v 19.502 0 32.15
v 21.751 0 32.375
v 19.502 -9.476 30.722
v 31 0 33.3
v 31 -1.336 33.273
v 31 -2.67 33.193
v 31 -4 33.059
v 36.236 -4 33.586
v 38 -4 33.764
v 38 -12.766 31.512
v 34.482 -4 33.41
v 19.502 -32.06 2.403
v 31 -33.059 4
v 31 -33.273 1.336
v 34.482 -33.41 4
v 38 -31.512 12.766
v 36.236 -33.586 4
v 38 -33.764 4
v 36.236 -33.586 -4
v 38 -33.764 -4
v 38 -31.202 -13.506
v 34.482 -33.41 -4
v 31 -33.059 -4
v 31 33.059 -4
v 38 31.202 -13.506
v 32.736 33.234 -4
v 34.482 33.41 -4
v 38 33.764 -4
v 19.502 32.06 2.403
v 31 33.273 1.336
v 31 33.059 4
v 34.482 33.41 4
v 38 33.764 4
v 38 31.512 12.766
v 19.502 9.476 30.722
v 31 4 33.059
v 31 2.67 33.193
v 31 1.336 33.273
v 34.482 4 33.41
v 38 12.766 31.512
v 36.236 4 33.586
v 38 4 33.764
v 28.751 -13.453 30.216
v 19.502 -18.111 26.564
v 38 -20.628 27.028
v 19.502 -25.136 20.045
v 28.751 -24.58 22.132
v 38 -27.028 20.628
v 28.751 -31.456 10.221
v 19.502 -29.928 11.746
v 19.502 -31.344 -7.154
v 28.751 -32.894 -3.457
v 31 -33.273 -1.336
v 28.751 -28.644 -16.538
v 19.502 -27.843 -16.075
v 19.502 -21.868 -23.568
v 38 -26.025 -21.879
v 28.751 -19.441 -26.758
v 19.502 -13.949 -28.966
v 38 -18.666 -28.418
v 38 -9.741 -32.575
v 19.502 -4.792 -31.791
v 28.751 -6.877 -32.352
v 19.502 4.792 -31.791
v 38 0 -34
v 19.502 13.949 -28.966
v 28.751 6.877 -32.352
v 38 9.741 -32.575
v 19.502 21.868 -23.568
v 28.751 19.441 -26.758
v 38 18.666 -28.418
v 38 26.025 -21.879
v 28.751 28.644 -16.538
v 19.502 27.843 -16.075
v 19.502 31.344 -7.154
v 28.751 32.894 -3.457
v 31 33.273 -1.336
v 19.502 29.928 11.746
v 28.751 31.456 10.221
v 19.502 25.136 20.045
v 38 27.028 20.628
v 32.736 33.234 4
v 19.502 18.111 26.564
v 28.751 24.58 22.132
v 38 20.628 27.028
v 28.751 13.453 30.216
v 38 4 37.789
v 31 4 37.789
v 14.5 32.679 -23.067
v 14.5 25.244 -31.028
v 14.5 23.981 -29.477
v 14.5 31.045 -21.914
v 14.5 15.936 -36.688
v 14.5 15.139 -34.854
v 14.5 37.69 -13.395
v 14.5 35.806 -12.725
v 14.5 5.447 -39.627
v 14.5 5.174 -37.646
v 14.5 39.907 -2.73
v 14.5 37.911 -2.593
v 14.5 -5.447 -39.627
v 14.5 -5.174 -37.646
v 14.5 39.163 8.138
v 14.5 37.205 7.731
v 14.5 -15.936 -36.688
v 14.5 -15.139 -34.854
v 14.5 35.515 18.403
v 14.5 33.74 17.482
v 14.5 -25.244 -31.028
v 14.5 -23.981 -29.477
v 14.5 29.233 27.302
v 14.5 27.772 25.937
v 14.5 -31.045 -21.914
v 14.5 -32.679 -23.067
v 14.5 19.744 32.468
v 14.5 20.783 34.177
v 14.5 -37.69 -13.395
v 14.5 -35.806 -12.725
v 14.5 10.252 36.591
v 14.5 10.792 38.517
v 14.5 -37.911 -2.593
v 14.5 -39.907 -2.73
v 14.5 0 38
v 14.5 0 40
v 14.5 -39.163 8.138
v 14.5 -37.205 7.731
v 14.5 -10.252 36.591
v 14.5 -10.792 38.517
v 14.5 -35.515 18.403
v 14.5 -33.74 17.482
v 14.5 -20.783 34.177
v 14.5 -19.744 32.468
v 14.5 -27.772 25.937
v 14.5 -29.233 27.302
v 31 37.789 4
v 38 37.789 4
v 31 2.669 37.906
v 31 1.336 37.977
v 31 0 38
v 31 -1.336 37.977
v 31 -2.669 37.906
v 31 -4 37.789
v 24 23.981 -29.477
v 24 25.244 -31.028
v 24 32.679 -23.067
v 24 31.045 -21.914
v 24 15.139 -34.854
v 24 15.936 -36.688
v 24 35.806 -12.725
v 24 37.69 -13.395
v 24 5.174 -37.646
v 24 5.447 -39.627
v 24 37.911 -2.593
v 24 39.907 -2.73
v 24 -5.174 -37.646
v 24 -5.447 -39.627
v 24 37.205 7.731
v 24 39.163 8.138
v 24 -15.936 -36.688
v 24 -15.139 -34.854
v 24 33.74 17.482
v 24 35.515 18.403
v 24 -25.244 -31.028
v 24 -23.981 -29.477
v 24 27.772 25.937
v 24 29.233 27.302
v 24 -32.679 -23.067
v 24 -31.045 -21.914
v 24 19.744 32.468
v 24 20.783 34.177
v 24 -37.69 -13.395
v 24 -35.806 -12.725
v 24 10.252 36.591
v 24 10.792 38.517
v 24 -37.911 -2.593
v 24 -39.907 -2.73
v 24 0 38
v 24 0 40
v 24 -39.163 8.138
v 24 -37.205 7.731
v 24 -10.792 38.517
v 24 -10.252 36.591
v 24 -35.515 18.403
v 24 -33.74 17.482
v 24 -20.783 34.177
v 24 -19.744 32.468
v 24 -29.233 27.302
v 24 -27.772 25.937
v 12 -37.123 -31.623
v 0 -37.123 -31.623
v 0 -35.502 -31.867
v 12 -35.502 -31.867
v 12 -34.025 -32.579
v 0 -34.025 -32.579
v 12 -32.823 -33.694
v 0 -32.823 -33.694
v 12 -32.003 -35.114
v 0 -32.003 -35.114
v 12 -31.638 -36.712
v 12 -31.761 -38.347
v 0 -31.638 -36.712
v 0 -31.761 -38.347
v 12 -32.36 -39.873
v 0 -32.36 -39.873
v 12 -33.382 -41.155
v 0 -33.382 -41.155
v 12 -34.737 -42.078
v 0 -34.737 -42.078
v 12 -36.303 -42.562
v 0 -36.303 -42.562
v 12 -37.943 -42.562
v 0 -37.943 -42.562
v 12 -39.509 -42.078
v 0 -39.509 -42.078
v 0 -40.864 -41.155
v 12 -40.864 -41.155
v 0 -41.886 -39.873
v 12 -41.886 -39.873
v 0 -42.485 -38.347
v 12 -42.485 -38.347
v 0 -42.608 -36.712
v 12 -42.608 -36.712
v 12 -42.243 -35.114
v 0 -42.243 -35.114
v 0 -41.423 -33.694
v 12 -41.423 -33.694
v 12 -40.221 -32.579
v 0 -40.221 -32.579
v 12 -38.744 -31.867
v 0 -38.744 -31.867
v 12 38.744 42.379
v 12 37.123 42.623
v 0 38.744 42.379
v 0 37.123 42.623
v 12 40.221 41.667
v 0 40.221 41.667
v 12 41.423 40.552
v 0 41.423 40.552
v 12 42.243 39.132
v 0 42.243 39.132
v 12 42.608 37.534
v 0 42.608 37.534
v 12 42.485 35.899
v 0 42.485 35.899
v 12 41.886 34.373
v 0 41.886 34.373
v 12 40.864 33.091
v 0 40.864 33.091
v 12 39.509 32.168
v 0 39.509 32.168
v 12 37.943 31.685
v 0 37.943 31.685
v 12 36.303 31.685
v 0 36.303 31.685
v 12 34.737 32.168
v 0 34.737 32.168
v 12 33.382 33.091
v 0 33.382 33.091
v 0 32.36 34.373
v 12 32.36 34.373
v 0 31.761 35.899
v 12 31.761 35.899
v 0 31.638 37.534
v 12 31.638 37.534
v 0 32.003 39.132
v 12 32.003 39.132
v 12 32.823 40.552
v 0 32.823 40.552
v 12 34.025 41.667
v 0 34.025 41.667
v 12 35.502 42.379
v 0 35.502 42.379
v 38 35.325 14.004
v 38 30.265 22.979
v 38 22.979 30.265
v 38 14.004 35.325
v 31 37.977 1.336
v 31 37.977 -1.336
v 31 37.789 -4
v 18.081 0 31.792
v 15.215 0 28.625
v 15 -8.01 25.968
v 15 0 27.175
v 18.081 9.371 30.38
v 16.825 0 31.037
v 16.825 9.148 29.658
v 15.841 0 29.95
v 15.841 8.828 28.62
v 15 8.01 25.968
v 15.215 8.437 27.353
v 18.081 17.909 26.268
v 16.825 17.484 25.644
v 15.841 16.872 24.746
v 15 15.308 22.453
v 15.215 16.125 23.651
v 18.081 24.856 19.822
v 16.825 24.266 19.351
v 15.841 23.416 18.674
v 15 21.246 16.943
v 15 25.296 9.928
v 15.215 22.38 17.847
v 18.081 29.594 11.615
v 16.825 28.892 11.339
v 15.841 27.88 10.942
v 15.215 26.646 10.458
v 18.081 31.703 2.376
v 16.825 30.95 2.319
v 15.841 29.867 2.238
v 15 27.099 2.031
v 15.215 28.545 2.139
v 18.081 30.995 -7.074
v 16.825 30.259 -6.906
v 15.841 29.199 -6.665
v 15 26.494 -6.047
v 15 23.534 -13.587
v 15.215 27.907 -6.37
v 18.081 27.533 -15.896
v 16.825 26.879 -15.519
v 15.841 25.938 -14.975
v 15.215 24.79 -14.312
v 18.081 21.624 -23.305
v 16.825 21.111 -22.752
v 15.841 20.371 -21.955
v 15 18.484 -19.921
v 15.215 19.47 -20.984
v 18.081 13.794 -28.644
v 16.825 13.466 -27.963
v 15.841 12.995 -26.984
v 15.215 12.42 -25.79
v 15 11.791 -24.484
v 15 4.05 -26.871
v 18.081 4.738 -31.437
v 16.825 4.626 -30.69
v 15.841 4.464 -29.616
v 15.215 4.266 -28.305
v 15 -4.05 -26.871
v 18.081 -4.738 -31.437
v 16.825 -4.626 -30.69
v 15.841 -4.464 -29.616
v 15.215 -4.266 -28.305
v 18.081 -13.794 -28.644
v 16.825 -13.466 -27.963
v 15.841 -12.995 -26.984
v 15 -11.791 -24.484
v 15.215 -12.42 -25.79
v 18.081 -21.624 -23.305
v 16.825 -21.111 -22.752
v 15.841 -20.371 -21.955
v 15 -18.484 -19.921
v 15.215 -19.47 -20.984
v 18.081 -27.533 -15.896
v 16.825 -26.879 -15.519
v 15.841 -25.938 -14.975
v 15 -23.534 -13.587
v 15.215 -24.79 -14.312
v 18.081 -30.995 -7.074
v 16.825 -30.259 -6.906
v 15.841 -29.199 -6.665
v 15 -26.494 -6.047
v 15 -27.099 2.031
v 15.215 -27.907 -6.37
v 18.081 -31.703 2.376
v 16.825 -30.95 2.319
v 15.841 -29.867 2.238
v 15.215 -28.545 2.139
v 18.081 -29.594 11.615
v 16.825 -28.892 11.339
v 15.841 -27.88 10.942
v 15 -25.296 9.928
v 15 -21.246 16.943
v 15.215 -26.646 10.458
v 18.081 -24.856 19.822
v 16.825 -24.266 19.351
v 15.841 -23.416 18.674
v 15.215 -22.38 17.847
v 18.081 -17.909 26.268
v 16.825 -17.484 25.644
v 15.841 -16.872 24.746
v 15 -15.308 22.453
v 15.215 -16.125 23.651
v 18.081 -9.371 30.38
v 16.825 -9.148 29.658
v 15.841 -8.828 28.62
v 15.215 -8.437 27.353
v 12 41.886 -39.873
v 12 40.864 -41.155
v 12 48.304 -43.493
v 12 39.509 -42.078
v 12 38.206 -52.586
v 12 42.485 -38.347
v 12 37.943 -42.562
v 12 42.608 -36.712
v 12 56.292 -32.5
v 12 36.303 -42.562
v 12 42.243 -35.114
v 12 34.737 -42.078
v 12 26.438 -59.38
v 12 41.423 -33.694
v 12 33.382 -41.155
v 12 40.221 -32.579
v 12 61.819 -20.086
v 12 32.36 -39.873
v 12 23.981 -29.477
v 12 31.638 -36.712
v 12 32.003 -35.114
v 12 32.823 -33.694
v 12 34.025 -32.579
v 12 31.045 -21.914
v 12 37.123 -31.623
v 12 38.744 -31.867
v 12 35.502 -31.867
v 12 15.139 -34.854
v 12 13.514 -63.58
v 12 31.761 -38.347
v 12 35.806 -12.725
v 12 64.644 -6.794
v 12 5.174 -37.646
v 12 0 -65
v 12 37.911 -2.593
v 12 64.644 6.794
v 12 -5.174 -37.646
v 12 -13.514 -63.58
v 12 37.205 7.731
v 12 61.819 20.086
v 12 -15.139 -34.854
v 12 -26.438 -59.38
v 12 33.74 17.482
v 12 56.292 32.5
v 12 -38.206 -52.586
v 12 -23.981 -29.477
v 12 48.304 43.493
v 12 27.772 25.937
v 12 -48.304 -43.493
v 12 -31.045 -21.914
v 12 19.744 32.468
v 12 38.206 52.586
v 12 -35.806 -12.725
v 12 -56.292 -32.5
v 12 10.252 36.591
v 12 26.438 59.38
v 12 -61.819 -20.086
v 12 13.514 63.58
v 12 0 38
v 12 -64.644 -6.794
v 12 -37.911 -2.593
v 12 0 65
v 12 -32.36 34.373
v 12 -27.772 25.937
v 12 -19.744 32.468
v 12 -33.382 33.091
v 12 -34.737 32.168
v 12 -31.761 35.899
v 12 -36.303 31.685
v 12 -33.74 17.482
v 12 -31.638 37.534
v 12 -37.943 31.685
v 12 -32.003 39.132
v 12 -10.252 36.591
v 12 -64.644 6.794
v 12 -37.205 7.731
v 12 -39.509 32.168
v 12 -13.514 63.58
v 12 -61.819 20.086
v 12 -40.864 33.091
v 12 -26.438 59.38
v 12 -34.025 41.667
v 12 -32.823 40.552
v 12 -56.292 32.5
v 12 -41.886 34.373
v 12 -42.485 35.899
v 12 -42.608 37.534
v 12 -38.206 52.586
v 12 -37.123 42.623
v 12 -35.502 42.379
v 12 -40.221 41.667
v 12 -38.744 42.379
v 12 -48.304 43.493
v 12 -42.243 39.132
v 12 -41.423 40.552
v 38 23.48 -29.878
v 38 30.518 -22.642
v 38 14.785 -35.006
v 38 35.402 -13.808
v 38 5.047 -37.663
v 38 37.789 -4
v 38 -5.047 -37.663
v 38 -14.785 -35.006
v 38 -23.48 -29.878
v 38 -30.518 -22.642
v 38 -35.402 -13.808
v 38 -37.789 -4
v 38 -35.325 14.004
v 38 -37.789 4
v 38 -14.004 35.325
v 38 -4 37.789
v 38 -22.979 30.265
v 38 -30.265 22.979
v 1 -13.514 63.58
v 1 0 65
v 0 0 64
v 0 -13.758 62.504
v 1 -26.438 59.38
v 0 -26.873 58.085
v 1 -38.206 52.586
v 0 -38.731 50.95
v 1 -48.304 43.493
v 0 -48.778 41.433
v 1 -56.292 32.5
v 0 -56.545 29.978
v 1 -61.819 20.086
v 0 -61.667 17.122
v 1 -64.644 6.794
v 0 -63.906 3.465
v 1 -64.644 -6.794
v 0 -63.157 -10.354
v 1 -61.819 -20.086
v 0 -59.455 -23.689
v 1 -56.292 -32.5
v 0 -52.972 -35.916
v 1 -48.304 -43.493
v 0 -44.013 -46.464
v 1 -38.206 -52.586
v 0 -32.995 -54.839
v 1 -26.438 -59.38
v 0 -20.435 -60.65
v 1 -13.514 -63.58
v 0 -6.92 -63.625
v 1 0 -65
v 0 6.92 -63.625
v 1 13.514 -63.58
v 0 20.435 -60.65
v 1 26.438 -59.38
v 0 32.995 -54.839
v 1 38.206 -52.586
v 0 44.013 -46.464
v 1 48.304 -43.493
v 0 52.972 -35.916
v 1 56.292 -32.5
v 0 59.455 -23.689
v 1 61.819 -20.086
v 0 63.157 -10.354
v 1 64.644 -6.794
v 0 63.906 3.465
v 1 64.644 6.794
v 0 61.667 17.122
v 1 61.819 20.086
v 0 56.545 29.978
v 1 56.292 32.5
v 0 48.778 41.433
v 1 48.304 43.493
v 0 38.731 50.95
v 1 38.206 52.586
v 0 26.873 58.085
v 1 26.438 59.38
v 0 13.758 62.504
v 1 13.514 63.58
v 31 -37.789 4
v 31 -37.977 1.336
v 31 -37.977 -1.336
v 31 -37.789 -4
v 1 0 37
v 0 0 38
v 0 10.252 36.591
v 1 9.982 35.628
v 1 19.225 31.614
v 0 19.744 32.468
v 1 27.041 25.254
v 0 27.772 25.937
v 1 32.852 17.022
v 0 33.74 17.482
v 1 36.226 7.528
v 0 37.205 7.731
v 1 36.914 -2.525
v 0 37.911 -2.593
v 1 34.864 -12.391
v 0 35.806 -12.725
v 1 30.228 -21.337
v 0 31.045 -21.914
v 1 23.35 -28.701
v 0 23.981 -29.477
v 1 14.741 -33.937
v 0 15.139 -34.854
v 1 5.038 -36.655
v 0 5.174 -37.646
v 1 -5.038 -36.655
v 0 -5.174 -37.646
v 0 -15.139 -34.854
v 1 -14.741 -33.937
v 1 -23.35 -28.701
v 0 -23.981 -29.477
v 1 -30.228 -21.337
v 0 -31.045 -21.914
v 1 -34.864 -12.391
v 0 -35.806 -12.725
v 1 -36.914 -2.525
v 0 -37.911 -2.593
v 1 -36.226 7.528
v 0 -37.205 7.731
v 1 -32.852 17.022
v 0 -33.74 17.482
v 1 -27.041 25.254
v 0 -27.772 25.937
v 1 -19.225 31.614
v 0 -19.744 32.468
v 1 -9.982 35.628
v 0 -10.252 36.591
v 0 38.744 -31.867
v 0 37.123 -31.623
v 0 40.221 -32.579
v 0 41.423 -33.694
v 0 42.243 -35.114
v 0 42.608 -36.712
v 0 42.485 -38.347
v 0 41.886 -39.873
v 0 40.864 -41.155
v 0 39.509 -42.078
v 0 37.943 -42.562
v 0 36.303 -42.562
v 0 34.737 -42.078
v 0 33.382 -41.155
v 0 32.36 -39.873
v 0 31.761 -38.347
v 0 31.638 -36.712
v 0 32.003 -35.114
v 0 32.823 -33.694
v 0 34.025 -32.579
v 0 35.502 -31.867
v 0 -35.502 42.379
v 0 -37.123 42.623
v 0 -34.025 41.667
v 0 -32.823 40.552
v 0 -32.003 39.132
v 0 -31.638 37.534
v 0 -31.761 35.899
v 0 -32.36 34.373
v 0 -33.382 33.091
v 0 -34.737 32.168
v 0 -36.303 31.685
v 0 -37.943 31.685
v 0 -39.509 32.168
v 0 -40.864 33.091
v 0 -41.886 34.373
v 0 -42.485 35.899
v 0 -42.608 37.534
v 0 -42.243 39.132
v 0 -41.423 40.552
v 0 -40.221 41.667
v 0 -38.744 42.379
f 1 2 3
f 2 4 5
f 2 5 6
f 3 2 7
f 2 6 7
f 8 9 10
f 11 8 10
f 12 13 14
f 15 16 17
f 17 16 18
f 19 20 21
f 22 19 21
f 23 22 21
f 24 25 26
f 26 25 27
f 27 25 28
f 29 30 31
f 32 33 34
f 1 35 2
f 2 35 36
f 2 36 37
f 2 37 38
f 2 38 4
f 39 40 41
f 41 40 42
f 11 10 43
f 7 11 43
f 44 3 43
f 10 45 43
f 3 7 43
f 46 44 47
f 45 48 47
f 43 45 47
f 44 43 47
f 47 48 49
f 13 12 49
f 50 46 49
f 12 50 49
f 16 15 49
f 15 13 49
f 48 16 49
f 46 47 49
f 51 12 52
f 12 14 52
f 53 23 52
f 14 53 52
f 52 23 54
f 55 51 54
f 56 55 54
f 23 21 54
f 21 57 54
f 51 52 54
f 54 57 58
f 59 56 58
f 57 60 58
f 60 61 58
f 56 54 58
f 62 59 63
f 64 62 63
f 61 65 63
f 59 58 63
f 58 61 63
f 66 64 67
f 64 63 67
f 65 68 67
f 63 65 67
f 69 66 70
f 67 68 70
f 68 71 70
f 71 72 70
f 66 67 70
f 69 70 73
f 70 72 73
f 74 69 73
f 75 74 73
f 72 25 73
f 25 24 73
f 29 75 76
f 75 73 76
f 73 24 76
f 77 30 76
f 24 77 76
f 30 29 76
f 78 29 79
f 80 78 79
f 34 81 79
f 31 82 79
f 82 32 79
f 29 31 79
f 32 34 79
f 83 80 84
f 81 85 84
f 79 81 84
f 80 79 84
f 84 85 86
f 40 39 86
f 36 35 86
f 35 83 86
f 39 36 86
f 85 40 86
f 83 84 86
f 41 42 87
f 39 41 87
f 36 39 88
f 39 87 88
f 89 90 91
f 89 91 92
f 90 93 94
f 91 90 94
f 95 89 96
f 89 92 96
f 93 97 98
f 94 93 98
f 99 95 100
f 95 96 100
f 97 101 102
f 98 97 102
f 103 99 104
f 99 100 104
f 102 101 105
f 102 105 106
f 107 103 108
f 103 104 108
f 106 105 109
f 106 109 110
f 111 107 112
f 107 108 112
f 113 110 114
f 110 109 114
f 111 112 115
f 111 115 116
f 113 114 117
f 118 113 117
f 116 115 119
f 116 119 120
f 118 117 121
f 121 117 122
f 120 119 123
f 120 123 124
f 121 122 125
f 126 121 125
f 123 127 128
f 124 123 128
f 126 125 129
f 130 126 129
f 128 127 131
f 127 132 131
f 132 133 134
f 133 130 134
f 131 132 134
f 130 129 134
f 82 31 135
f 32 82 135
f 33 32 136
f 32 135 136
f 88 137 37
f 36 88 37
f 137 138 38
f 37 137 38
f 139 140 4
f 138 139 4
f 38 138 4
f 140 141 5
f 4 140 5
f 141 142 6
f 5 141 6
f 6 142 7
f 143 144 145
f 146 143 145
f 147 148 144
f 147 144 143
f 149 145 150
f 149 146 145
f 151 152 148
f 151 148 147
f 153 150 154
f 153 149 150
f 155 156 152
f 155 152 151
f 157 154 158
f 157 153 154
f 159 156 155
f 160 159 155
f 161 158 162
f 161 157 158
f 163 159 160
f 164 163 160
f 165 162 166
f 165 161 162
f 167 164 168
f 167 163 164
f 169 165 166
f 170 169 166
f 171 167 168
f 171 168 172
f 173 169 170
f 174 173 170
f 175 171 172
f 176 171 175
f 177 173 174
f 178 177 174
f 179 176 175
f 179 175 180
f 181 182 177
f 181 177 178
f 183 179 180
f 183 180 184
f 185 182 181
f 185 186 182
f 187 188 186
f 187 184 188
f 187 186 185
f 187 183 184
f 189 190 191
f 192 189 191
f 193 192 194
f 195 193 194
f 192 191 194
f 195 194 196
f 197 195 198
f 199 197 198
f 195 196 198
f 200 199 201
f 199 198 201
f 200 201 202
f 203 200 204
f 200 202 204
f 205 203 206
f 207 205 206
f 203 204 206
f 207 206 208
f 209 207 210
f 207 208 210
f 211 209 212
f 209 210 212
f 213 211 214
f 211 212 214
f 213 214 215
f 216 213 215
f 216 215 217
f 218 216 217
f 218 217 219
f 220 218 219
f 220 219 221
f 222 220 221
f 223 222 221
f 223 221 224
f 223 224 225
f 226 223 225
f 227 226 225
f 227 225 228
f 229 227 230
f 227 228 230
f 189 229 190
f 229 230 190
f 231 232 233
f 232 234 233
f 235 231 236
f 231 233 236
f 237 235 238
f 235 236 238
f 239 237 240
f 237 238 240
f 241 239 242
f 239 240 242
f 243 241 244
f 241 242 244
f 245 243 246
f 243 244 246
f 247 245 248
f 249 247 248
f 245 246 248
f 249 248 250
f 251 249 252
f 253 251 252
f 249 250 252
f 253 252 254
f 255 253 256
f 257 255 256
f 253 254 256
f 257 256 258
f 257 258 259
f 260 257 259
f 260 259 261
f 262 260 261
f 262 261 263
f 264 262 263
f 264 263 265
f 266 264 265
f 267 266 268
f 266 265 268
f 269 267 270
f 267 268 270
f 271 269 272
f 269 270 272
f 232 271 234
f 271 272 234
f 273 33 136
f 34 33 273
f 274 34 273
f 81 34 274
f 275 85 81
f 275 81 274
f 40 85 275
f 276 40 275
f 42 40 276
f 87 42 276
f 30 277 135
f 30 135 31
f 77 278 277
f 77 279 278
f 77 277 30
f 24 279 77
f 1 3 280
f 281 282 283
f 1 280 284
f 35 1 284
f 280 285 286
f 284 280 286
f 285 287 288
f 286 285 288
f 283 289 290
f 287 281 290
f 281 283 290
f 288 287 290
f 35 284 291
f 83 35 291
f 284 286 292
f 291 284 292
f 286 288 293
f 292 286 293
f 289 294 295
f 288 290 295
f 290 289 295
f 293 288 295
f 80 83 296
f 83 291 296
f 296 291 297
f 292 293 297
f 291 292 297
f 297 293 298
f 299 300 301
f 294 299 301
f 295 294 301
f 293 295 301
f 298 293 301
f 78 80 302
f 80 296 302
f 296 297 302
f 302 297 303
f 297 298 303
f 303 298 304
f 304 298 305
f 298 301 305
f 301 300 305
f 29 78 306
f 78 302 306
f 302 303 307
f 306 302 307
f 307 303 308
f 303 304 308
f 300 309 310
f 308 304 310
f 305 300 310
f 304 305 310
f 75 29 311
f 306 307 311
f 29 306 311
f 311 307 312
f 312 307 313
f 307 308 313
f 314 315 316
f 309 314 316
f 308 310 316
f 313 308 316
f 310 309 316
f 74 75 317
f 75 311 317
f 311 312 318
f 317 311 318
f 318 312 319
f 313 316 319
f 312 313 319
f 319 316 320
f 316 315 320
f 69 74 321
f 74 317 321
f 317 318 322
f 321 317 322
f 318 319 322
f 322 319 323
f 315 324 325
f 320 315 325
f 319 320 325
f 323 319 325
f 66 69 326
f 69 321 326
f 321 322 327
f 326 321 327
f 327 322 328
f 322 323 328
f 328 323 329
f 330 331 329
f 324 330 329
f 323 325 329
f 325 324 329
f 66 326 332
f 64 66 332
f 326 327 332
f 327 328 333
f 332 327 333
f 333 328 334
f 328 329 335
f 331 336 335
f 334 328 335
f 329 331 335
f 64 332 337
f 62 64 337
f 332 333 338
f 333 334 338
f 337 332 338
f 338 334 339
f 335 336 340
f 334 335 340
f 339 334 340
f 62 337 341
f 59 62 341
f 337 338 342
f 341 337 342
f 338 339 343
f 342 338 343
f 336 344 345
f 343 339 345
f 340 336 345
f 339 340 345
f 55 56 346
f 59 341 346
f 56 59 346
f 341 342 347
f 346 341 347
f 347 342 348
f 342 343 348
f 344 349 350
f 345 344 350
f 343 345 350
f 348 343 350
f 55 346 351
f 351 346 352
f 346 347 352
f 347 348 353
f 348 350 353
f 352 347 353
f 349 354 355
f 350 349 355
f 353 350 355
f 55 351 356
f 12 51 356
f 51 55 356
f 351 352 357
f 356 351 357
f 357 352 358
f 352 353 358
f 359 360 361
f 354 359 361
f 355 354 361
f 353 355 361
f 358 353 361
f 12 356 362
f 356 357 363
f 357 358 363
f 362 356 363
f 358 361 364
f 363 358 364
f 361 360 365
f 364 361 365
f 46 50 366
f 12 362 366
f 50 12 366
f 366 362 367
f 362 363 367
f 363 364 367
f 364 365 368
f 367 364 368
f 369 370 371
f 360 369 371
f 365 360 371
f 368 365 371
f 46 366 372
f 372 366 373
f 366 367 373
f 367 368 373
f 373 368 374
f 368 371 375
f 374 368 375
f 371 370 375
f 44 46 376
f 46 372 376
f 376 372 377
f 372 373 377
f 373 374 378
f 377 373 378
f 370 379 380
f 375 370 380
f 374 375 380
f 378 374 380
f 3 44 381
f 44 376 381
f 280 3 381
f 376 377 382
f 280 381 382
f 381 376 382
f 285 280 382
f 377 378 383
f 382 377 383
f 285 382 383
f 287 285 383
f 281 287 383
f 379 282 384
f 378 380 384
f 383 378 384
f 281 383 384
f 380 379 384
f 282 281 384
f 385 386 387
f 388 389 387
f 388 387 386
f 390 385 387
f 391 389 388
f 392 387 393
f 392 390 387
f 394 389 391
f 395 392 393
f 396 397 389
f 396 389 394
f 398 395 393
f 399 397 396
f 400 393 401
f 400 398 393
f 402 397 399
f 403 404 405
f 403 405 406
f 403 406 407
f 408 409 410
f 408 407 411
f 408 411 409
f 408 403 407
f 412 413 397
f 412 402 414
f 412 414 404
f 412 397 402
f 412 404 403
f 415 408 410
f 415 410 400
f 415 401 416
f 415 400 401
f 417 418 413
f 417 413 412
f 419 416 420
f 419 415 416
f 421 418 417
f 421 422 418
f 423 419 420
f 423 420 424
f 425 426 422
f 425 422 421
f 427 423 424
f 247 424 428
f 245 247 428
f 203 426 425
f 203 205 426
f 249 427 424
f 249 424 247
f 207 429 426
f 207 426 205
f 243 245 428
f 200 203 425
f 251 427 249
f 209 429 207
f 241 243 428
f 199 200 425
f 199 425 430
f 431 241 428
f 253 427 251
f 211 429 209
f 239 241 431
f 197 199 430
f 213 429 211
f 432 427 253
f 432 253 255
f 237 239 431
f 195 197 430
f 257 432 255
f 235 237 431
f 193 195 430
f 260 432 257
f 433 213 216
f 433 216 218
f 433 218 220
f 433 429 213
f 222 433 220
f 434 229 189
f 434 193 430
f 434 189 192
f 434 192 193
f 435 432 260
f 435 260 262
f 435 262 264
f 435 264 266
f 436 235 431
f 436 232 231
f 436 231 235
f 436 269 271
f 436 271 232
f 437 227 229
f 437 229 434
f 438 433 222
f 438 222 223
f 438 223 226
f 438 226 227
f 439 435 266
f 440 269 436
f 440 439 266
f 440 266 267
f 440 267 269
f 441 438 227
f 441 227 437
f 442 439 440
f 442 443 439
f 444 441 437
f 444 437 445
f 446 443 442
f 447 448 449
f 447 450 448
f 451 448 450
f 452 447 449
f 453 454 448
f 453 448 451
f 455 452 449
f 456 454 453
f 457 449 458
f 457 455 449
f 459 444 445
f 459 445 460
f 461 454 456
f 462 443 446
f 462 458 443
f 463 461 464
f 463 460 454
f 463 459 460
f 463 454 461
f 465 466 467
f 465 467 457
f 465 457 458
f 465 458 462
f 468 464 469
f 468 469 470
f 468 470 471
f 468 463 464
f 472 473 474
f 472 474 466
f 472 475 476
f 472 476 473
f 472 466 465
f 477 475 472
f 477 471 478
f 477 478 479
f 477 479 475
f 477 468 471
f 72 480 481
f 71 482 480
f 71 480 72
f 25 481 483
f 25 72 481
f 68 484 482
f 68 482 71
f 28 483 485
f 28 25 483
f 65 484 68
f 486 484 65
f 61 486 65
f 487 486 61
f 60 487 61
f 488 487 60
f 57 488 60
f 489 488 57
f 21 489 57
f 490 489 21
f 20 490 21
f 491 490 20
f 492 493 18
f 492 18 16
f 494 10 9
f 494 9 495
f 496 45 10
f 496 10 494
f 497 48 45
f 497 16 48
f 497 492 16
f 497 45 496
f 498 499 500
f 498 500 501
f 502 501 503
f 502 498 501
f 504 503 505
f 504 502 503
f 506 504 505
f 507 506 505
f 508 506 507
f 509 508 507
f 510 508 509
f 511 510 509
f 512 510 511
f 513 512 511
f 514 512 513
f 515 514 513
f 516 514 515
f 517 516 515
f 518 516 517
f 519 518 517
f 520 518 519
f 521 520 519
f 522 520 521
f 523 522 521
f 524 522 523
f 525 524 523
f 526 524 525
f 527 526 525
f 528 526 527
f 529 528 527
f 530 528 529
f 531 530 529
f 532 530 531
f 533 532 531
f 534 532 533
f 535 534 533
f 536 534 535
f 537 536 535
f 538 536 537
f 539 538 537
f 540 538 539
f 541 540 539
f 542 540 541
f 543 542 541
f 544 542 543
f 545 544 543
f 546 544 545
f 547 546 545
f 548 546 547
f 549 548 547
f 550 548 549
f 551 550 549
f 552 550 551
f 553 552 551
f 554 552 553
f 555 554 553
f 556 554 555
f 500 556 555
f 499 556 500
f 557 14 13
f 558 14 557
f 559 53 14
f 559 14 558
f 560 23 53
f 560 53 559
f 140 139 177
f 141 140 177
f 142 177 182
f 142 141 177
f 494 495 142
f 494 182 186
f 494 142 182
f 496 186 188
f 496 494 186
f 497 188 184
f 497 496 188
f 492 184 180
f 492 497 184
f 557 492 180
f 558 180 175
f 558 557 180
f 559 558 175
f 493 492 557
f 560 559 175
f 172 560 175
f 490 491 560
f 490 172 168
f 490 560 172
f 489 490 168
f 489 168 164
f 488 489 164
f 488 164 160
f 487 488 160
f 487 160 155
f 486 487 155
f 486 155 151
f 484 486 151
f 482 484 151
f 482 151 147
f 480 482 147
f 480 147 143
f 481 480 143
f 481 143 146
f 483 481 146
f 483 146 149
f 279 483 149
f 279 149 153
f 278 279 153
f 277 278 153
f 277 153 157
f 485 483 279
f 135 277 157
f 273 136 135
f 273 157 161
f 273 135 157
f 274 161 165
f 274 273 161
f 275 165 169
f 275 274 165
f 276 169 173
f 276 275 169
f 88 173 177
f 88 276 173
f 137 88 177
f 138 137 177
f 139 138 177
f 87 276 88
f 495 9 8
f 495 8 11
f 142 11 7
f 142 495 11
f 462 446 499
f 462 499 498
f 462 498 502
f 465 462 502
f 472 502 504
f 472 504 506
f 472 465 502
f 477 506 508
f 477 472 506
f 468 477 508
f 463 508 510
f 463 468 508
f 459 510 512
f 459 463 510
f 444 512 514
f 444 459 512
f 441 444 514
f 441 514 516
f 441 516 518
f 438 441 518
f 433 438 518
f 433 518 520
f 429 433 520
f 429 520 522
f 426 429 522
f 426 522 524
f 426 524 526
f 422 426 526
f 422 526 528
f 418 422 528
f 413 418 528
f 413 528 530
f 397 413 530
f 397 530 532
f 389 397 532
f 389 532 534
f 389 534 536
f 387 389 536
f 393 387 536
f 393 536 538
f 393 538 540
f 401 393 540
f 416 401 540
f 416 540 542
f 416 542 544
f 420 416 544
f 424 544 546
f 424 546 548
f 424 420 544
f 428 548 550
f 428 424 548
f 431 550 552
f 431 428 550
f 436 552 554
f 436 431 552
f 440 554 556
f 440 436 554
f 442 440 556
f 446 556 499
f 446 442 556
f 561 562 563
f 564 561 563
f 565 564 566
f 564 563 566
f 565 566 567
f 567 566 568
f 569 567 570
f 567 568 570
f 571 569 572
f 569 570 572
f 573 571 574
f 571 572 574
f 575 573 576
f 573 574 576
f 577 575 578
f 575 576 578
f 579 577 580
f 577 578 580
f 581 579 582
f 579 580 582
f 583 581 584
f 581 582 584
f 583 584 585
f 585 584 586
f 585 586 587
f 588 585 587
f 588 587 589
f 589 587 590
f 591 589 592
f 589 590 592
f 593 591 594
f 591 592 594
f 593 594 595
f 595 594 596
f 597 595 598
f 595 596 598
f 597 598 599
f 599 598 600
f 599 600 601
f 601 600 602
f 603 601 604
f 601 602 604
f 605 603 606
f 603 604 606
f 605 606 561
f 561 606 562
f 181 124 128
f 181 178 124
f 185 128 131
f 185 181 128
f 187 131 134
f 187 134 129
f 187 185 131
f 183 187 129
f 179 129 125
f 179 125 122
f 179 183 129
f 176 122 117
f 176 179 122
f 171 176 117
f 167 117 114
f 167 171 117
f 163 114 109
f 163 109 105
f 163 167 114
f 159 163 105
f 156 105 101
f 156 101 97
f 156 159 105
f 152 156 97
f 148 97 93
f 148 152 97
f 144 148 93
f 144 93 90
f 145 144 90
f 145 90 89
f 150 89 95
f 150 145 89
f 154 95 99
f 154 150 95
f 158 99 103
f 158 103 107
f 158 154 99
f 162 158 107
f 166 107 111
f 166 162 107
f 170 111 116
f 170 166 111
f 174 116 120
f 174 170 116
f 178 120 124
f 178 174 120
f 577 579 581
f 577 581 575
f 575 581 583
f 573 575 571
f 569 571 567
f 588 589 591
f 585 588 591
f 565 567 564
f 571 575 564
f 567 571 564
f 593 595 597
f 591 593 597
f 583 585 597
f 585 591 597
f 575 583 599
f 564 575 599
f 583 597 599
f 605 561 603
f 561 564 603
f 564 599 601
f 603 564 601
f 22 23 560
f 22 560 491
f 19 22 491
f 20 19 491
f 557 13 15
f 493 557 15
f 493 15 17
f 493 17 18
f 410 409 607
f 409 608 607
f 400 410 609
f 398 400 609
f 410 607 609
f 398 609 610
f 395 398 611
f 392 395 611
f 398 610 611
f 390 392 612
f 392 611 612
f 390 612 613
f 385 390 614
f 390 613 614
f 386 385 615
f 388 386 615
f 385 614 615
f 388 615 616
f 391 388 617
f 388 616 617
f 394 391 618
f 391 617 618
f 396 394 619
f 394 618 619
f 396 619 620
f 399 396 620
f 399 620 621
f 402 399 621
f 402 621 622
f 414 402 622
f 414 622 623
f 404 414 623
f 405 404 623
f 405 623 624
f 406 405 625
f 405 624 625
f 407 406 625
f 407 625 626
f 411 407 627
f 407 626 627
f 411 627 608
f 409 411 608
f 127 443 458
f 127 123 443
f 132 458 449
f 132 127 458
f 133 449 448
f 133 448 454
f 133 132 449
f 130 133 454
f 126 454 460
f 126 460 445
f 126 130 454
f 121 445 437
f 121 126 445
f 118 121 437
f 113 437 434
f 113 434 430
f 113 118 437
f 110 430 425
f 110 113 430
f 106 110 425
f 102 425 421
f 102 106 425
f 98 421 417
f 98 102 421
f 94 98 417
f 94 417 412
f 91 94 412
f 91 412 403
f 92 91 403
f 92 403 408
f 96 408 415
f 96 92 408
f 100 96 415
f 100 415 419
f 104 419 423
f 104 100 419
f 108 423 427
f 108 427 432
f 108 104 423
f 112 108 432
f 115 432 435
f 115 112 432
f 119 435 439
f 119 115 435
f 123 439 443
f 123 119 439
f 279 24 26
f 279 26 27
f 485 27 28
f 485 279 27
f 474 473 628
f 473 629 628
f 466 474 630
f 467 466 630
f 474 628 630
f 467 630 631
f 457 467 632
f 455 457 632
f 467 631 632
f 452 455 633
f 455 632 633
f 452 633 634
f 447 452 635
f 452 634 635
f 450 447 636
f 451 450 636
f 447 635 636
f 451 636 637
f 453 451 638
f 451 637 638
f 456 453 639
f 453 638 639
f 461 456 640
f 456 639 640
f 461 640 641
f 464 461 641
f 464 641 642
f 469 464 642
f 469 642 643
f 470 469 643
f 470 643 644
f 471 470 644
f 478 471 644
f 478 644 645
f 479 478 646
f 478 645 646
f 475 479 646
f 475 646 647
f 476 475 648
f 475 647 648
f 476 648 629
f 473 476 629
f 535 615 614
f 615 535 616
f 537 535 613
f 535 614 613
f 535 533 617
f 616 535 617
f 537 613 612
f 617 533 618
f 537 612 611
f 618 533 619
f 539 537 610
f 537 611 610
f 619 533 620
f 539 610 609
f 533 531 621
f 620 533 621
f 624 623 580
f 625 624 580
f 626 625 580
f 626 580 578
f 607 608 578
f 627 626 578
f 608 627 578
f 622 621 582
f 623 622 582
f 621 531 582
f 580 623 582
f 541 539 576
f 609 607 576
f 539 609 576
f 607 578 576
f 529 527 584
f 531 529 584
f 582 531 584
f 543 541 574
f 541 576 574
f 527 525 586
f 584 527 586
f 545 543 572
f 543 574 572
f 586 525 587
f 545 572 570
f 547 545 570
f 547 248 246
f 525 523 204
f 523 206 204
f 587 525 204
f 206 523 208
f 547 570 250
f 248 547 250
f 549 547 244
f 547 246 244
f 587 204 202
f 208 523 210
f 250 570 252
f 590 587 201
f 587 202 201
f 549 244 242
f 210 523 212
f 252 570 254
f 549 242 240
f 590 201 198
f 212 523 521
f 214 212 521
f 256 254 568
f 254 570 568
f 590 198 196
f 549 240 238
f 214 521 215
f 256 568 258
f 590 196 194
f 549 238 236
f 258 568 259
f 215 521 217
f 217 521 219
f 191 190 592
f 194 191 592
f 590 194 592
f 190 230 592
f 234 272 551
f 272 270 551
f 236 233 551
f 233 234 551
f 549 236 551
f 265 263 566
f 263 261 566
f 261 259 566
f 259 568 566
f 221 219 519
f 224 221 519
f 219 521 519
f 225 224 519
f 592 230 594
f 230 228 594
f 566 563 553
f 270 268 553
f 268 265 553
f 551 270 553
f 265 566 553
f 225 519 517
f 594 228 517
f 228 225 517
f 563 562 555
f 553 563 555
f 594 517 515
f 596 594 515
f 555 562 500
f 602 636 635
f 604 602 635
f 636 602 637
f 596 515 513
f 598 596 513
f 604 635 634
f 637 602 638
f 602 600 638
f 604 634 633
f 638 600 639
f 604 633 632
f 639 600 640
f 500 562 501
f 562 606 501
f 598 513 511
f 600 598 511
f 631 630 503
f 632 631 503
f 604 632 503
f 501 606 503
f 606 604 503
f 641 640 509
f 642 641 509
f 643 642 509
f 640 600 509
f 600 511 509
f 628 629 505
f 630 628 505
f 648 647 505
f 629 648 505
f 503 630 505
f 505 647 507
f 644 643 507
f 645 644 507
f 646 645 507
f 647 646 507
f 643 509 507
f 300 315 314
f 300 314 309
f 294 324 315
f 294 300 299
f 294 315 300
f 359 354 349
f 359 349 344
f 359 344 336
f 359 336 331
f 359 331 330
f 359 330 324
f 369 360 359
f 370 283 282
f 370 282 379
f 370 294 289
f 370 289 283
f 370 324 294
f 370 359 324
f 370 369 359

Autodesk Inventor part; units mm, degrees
ref_plane "YZ Plane" through (0, 0, 0) normal (1, 0, 0) x (0, 1, 0)
ref_plane "XZ Plane" through (0, 0, 0) normal (0, 1, 0) x (-1, 0, 0)
ref_plane "XY Plane" through (0, 0, 0) normal (0, 0, 1) x (1, 0, 0)
sketch "草图1" plane through (0, 0, 0) normal (0, 1, 0) x (-1, 0, 0)
  line L0 (0, 65) -> (-12, 65)
  line L1 (-12, 65) -> (-12, 38)
  line L2 (-12, 38) -> (-14.5, 38)
  line L3 (-14.5, 38) -> (-14.5, 40)
  line L4 (-14.5, 40) -> (-24, 40)
  line L5 (-24, 40) -> (-24, 38)
  line L6 (-24, 38) -> (-38, 38)
  line L7 (-38, 38) -> (-38, 0)
  line L8 (-38, 0) -> (0, 0)
  line L9 (0, 0) -> (0, 65)
  line L10 (0, 38) -> (-1, 37)
  line L11 (-1, 37) -> (-1, 0)
  line L12 (-38, 34) -> (-15, 31.6998)
  line L13 (-15, 31.6998) -> (-15, 0)
  line L14 (7.6, 0) -> (-45.6, 0) projected
  dimension "d2" = 65
  dimension "d4" = 26
  dimension "d5" = 12
  dimension "d6" = 40
  dimension "d7" = 38
  dimension "d8" = 12
  dimension "d9" = 2.5
  dimension "d10" = 38
  dimension "d11" = 45
  dimension "d12" = 1
  dimension "d13" = 15
  dimension "d14" = 34
  dimension "d15" = 84.289
revolve "旋转1" add sketch "草图1" angle 360 about axis through (-10, 0, 0) along (1, 0, 0) contours L9 L10 L11 L8 L13 L12 L7 L6 L5 L4 L3 L2 L1 L0
sketch "草图2" plane through (0, 0, 0) normal (0, 1, 0) x (-1, 0, 0)
  line L0 (-24, 38) -> (-38, 38) projected
  line L1 (-38, 38) -> (-31, 38)
  line L2 (-31, 38) -> (-31, -20)
  line L3 (-31, -20) -> (-38, -20)
  line L4 (-38, -20) -> (-38, 38)
  point P0 (0, 0)
  dimension "d17" = 7
extrude "拉伸1" cut sketch "草图2" along normal mid plane 8
sketch "草图3" plane through (0, 0, 0) normal (0, 0, 1) x (1, 0, 0)
  line L0 (38, 4) -> (38, 38) projected
  line L1 (24, -38) -> (38, -38) projected
  line L2 (38, 38) -> (31, 38)
  line L3 (31, 38) -> (31, -38)
  line L4 (31, -38) -> (38, -38)
  line L5 (38, -38) -> (38, 38)
  point P0 (0, 0)
  point P1 (38, -4)
  dimension "d20" = 7
extrude "拉伸2" cut sketch "草图3" along normal mid plane 8
sketch "草图4" plane through (0, 0, 0) normal (-1, 0, 0) x (0, 0, 1)
  circle A0 centre (37.1231, 37.1231) radius 5.5
  circle A1 centre (-37.1231, 37.1231) radius 5.5
  circle A2 centre (-37.1231, -37.1231) radius 5.5
  circle A3 centre (37.1231, -37.1231) radius 5.5
  line L0 (37.1231, 37.1231) -> (0, 0)
  line L1 (0, -91) -> (0, 91) projected
  dimension "d23" = 11
  dimension "d24" = 52.5
  dimension "d27" = 360
  dimension "d35" = 45
extrude "拉伸3" cut sketch "草图4" against normal up to surface (12 mm away)
chamfer "倒角1" distance 1 angle 45 1 edges at (0, 0, -65)
fillet "圆角1" radius 5 1 edges at (15, 0, -31.6998)
equation "\"d2\" = 0.5 * D2"
equation "\"d4\" = M"
equation "\"d5\" = e"
equation "\"d6\" = 0.5 * D"
equation "\"d7\" = 0.5 * D_d"
equation "\"d8\" = e1"
equation "\"d10\" = 0.5 * D_d"
equation "\"d13\" = b1"
equation "\"d14\" = 0.5 * D4"
equation "\"d17\" = h_b"
equation "\"d18\" = b"
equation "\"d20\" = h_b"
equation "\"d21\" = b"
equation "\"d23\" = d0"
equation "\"d24\" = 0.5 * D0"
equation "\"d29\" = b"
equation "\"d0\" = 11"
equation "\"D0\" = 105"
equation "\"D4\" = 68"
equation "\"D_d\" = 76"
equation "\"e\" = 12"
equation "\"e1\" = 12"
equation "\"b\" = 8"
equation "\"h_b\" = 7"
equation "\"M\" = 26"
equation "\"b1\" = 15"
equation "\"d1\" = 46"
equation "\"D2\" = 130"
equation "\"D\" = 80"
properties part number "低速轴承闷盖" material "灰口铁"
